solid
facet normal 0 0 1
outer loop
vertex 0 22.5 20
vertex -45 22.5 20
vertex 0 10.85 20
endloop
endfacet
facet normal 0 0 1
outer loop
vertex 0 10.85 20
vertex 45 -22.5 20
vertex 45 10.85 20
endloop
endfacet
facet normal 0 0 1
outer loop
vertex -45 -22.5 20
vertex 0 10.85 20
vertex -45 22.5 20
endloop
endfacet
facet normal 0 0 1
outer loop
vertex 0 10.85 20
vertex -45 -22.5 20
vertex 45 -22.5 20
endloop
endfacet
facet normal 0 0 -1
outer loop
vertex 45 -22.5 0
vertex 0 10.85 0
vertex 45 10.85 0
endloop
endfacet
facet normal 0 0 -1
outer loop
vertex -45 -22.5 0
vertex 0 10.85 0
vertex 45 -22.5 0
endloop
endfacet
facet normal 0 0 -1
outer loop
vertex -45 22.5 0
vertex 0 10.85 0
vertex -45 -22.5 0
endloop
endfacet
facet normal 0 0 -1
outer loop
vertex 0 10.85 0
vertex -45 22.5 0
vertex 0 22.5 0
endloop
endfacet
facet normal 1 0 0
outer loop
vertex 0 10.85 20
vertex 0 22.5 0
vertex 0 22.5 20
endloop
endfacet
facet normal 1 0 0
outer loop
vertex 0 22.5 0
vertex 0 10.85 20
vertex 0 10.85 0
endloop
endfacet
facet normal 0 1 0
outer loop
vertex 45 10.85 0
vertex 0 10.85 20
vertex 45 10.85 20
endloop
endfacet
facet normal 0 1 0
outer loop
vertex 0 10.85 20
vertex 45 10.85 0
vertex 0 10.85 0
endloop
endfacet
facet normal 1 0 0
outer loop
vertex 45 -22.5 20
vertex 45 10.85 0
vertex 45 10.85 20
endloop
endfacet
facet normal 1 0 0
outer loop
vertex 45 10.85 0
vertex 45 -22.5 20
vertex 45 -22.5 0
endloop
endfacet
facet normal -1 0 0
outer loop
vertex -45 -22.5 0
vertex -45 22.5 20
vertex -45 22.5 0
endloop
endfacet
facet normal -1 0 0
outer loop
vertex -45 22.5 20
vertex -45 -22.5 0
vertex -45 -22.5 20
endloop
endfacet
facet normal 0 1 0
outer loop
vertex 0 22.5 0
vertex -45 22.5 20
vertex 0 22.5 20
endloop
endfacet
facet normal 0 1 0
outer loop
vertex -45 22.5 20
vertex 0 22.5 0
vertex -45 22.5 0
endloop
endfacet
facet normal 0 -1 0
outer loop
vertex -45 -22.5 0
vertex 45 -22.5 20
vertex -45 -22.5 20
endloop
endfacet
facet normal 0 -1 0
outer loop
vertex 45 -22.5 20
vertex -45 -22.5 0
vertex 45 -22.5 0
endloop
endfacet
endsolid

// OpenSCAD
// Drying rack for microscope slides - a solid block with a row of parallel slots open at the
// top, so slides standing on their long edge drop in and are supported below. NOVEL general part.
//

slides   = 10;
slide_l  = 75;
slide_w  = 25;
slide_t  = 1;
base_l   = 90;
base_w   = 45;
base_h   = 20;
slot_l   = 77;
slot_w   = 1.6;
slot_d   = 10;
slot_gap = 3.5;

$fn = 48;

slot_s = slide_l + 2 * slot_gap;                 // open slot length so the inner wall is 0.8 mm clear of the
                                                 // slide edges (slide length 75 mm, gap 3.5 mm)

difference() {
    translate([-base_l / 2, -base_w / 2, 0]) cube([base_l, base_w, base_h]);
    for (i = [0 : slides - 1]) {
        y = -(base_w / 2 - slot_s / 2) / 2 + i * slot_gap;
        translate([0, y, 0]) difference() {
            cube([slot_s, base_w, base_h]);                                     // cutting block
            translate([0, 0, -1]) cube([slot_s, slot_w, base_h + 2]);           // slot - open at the top
        }
    }
}
